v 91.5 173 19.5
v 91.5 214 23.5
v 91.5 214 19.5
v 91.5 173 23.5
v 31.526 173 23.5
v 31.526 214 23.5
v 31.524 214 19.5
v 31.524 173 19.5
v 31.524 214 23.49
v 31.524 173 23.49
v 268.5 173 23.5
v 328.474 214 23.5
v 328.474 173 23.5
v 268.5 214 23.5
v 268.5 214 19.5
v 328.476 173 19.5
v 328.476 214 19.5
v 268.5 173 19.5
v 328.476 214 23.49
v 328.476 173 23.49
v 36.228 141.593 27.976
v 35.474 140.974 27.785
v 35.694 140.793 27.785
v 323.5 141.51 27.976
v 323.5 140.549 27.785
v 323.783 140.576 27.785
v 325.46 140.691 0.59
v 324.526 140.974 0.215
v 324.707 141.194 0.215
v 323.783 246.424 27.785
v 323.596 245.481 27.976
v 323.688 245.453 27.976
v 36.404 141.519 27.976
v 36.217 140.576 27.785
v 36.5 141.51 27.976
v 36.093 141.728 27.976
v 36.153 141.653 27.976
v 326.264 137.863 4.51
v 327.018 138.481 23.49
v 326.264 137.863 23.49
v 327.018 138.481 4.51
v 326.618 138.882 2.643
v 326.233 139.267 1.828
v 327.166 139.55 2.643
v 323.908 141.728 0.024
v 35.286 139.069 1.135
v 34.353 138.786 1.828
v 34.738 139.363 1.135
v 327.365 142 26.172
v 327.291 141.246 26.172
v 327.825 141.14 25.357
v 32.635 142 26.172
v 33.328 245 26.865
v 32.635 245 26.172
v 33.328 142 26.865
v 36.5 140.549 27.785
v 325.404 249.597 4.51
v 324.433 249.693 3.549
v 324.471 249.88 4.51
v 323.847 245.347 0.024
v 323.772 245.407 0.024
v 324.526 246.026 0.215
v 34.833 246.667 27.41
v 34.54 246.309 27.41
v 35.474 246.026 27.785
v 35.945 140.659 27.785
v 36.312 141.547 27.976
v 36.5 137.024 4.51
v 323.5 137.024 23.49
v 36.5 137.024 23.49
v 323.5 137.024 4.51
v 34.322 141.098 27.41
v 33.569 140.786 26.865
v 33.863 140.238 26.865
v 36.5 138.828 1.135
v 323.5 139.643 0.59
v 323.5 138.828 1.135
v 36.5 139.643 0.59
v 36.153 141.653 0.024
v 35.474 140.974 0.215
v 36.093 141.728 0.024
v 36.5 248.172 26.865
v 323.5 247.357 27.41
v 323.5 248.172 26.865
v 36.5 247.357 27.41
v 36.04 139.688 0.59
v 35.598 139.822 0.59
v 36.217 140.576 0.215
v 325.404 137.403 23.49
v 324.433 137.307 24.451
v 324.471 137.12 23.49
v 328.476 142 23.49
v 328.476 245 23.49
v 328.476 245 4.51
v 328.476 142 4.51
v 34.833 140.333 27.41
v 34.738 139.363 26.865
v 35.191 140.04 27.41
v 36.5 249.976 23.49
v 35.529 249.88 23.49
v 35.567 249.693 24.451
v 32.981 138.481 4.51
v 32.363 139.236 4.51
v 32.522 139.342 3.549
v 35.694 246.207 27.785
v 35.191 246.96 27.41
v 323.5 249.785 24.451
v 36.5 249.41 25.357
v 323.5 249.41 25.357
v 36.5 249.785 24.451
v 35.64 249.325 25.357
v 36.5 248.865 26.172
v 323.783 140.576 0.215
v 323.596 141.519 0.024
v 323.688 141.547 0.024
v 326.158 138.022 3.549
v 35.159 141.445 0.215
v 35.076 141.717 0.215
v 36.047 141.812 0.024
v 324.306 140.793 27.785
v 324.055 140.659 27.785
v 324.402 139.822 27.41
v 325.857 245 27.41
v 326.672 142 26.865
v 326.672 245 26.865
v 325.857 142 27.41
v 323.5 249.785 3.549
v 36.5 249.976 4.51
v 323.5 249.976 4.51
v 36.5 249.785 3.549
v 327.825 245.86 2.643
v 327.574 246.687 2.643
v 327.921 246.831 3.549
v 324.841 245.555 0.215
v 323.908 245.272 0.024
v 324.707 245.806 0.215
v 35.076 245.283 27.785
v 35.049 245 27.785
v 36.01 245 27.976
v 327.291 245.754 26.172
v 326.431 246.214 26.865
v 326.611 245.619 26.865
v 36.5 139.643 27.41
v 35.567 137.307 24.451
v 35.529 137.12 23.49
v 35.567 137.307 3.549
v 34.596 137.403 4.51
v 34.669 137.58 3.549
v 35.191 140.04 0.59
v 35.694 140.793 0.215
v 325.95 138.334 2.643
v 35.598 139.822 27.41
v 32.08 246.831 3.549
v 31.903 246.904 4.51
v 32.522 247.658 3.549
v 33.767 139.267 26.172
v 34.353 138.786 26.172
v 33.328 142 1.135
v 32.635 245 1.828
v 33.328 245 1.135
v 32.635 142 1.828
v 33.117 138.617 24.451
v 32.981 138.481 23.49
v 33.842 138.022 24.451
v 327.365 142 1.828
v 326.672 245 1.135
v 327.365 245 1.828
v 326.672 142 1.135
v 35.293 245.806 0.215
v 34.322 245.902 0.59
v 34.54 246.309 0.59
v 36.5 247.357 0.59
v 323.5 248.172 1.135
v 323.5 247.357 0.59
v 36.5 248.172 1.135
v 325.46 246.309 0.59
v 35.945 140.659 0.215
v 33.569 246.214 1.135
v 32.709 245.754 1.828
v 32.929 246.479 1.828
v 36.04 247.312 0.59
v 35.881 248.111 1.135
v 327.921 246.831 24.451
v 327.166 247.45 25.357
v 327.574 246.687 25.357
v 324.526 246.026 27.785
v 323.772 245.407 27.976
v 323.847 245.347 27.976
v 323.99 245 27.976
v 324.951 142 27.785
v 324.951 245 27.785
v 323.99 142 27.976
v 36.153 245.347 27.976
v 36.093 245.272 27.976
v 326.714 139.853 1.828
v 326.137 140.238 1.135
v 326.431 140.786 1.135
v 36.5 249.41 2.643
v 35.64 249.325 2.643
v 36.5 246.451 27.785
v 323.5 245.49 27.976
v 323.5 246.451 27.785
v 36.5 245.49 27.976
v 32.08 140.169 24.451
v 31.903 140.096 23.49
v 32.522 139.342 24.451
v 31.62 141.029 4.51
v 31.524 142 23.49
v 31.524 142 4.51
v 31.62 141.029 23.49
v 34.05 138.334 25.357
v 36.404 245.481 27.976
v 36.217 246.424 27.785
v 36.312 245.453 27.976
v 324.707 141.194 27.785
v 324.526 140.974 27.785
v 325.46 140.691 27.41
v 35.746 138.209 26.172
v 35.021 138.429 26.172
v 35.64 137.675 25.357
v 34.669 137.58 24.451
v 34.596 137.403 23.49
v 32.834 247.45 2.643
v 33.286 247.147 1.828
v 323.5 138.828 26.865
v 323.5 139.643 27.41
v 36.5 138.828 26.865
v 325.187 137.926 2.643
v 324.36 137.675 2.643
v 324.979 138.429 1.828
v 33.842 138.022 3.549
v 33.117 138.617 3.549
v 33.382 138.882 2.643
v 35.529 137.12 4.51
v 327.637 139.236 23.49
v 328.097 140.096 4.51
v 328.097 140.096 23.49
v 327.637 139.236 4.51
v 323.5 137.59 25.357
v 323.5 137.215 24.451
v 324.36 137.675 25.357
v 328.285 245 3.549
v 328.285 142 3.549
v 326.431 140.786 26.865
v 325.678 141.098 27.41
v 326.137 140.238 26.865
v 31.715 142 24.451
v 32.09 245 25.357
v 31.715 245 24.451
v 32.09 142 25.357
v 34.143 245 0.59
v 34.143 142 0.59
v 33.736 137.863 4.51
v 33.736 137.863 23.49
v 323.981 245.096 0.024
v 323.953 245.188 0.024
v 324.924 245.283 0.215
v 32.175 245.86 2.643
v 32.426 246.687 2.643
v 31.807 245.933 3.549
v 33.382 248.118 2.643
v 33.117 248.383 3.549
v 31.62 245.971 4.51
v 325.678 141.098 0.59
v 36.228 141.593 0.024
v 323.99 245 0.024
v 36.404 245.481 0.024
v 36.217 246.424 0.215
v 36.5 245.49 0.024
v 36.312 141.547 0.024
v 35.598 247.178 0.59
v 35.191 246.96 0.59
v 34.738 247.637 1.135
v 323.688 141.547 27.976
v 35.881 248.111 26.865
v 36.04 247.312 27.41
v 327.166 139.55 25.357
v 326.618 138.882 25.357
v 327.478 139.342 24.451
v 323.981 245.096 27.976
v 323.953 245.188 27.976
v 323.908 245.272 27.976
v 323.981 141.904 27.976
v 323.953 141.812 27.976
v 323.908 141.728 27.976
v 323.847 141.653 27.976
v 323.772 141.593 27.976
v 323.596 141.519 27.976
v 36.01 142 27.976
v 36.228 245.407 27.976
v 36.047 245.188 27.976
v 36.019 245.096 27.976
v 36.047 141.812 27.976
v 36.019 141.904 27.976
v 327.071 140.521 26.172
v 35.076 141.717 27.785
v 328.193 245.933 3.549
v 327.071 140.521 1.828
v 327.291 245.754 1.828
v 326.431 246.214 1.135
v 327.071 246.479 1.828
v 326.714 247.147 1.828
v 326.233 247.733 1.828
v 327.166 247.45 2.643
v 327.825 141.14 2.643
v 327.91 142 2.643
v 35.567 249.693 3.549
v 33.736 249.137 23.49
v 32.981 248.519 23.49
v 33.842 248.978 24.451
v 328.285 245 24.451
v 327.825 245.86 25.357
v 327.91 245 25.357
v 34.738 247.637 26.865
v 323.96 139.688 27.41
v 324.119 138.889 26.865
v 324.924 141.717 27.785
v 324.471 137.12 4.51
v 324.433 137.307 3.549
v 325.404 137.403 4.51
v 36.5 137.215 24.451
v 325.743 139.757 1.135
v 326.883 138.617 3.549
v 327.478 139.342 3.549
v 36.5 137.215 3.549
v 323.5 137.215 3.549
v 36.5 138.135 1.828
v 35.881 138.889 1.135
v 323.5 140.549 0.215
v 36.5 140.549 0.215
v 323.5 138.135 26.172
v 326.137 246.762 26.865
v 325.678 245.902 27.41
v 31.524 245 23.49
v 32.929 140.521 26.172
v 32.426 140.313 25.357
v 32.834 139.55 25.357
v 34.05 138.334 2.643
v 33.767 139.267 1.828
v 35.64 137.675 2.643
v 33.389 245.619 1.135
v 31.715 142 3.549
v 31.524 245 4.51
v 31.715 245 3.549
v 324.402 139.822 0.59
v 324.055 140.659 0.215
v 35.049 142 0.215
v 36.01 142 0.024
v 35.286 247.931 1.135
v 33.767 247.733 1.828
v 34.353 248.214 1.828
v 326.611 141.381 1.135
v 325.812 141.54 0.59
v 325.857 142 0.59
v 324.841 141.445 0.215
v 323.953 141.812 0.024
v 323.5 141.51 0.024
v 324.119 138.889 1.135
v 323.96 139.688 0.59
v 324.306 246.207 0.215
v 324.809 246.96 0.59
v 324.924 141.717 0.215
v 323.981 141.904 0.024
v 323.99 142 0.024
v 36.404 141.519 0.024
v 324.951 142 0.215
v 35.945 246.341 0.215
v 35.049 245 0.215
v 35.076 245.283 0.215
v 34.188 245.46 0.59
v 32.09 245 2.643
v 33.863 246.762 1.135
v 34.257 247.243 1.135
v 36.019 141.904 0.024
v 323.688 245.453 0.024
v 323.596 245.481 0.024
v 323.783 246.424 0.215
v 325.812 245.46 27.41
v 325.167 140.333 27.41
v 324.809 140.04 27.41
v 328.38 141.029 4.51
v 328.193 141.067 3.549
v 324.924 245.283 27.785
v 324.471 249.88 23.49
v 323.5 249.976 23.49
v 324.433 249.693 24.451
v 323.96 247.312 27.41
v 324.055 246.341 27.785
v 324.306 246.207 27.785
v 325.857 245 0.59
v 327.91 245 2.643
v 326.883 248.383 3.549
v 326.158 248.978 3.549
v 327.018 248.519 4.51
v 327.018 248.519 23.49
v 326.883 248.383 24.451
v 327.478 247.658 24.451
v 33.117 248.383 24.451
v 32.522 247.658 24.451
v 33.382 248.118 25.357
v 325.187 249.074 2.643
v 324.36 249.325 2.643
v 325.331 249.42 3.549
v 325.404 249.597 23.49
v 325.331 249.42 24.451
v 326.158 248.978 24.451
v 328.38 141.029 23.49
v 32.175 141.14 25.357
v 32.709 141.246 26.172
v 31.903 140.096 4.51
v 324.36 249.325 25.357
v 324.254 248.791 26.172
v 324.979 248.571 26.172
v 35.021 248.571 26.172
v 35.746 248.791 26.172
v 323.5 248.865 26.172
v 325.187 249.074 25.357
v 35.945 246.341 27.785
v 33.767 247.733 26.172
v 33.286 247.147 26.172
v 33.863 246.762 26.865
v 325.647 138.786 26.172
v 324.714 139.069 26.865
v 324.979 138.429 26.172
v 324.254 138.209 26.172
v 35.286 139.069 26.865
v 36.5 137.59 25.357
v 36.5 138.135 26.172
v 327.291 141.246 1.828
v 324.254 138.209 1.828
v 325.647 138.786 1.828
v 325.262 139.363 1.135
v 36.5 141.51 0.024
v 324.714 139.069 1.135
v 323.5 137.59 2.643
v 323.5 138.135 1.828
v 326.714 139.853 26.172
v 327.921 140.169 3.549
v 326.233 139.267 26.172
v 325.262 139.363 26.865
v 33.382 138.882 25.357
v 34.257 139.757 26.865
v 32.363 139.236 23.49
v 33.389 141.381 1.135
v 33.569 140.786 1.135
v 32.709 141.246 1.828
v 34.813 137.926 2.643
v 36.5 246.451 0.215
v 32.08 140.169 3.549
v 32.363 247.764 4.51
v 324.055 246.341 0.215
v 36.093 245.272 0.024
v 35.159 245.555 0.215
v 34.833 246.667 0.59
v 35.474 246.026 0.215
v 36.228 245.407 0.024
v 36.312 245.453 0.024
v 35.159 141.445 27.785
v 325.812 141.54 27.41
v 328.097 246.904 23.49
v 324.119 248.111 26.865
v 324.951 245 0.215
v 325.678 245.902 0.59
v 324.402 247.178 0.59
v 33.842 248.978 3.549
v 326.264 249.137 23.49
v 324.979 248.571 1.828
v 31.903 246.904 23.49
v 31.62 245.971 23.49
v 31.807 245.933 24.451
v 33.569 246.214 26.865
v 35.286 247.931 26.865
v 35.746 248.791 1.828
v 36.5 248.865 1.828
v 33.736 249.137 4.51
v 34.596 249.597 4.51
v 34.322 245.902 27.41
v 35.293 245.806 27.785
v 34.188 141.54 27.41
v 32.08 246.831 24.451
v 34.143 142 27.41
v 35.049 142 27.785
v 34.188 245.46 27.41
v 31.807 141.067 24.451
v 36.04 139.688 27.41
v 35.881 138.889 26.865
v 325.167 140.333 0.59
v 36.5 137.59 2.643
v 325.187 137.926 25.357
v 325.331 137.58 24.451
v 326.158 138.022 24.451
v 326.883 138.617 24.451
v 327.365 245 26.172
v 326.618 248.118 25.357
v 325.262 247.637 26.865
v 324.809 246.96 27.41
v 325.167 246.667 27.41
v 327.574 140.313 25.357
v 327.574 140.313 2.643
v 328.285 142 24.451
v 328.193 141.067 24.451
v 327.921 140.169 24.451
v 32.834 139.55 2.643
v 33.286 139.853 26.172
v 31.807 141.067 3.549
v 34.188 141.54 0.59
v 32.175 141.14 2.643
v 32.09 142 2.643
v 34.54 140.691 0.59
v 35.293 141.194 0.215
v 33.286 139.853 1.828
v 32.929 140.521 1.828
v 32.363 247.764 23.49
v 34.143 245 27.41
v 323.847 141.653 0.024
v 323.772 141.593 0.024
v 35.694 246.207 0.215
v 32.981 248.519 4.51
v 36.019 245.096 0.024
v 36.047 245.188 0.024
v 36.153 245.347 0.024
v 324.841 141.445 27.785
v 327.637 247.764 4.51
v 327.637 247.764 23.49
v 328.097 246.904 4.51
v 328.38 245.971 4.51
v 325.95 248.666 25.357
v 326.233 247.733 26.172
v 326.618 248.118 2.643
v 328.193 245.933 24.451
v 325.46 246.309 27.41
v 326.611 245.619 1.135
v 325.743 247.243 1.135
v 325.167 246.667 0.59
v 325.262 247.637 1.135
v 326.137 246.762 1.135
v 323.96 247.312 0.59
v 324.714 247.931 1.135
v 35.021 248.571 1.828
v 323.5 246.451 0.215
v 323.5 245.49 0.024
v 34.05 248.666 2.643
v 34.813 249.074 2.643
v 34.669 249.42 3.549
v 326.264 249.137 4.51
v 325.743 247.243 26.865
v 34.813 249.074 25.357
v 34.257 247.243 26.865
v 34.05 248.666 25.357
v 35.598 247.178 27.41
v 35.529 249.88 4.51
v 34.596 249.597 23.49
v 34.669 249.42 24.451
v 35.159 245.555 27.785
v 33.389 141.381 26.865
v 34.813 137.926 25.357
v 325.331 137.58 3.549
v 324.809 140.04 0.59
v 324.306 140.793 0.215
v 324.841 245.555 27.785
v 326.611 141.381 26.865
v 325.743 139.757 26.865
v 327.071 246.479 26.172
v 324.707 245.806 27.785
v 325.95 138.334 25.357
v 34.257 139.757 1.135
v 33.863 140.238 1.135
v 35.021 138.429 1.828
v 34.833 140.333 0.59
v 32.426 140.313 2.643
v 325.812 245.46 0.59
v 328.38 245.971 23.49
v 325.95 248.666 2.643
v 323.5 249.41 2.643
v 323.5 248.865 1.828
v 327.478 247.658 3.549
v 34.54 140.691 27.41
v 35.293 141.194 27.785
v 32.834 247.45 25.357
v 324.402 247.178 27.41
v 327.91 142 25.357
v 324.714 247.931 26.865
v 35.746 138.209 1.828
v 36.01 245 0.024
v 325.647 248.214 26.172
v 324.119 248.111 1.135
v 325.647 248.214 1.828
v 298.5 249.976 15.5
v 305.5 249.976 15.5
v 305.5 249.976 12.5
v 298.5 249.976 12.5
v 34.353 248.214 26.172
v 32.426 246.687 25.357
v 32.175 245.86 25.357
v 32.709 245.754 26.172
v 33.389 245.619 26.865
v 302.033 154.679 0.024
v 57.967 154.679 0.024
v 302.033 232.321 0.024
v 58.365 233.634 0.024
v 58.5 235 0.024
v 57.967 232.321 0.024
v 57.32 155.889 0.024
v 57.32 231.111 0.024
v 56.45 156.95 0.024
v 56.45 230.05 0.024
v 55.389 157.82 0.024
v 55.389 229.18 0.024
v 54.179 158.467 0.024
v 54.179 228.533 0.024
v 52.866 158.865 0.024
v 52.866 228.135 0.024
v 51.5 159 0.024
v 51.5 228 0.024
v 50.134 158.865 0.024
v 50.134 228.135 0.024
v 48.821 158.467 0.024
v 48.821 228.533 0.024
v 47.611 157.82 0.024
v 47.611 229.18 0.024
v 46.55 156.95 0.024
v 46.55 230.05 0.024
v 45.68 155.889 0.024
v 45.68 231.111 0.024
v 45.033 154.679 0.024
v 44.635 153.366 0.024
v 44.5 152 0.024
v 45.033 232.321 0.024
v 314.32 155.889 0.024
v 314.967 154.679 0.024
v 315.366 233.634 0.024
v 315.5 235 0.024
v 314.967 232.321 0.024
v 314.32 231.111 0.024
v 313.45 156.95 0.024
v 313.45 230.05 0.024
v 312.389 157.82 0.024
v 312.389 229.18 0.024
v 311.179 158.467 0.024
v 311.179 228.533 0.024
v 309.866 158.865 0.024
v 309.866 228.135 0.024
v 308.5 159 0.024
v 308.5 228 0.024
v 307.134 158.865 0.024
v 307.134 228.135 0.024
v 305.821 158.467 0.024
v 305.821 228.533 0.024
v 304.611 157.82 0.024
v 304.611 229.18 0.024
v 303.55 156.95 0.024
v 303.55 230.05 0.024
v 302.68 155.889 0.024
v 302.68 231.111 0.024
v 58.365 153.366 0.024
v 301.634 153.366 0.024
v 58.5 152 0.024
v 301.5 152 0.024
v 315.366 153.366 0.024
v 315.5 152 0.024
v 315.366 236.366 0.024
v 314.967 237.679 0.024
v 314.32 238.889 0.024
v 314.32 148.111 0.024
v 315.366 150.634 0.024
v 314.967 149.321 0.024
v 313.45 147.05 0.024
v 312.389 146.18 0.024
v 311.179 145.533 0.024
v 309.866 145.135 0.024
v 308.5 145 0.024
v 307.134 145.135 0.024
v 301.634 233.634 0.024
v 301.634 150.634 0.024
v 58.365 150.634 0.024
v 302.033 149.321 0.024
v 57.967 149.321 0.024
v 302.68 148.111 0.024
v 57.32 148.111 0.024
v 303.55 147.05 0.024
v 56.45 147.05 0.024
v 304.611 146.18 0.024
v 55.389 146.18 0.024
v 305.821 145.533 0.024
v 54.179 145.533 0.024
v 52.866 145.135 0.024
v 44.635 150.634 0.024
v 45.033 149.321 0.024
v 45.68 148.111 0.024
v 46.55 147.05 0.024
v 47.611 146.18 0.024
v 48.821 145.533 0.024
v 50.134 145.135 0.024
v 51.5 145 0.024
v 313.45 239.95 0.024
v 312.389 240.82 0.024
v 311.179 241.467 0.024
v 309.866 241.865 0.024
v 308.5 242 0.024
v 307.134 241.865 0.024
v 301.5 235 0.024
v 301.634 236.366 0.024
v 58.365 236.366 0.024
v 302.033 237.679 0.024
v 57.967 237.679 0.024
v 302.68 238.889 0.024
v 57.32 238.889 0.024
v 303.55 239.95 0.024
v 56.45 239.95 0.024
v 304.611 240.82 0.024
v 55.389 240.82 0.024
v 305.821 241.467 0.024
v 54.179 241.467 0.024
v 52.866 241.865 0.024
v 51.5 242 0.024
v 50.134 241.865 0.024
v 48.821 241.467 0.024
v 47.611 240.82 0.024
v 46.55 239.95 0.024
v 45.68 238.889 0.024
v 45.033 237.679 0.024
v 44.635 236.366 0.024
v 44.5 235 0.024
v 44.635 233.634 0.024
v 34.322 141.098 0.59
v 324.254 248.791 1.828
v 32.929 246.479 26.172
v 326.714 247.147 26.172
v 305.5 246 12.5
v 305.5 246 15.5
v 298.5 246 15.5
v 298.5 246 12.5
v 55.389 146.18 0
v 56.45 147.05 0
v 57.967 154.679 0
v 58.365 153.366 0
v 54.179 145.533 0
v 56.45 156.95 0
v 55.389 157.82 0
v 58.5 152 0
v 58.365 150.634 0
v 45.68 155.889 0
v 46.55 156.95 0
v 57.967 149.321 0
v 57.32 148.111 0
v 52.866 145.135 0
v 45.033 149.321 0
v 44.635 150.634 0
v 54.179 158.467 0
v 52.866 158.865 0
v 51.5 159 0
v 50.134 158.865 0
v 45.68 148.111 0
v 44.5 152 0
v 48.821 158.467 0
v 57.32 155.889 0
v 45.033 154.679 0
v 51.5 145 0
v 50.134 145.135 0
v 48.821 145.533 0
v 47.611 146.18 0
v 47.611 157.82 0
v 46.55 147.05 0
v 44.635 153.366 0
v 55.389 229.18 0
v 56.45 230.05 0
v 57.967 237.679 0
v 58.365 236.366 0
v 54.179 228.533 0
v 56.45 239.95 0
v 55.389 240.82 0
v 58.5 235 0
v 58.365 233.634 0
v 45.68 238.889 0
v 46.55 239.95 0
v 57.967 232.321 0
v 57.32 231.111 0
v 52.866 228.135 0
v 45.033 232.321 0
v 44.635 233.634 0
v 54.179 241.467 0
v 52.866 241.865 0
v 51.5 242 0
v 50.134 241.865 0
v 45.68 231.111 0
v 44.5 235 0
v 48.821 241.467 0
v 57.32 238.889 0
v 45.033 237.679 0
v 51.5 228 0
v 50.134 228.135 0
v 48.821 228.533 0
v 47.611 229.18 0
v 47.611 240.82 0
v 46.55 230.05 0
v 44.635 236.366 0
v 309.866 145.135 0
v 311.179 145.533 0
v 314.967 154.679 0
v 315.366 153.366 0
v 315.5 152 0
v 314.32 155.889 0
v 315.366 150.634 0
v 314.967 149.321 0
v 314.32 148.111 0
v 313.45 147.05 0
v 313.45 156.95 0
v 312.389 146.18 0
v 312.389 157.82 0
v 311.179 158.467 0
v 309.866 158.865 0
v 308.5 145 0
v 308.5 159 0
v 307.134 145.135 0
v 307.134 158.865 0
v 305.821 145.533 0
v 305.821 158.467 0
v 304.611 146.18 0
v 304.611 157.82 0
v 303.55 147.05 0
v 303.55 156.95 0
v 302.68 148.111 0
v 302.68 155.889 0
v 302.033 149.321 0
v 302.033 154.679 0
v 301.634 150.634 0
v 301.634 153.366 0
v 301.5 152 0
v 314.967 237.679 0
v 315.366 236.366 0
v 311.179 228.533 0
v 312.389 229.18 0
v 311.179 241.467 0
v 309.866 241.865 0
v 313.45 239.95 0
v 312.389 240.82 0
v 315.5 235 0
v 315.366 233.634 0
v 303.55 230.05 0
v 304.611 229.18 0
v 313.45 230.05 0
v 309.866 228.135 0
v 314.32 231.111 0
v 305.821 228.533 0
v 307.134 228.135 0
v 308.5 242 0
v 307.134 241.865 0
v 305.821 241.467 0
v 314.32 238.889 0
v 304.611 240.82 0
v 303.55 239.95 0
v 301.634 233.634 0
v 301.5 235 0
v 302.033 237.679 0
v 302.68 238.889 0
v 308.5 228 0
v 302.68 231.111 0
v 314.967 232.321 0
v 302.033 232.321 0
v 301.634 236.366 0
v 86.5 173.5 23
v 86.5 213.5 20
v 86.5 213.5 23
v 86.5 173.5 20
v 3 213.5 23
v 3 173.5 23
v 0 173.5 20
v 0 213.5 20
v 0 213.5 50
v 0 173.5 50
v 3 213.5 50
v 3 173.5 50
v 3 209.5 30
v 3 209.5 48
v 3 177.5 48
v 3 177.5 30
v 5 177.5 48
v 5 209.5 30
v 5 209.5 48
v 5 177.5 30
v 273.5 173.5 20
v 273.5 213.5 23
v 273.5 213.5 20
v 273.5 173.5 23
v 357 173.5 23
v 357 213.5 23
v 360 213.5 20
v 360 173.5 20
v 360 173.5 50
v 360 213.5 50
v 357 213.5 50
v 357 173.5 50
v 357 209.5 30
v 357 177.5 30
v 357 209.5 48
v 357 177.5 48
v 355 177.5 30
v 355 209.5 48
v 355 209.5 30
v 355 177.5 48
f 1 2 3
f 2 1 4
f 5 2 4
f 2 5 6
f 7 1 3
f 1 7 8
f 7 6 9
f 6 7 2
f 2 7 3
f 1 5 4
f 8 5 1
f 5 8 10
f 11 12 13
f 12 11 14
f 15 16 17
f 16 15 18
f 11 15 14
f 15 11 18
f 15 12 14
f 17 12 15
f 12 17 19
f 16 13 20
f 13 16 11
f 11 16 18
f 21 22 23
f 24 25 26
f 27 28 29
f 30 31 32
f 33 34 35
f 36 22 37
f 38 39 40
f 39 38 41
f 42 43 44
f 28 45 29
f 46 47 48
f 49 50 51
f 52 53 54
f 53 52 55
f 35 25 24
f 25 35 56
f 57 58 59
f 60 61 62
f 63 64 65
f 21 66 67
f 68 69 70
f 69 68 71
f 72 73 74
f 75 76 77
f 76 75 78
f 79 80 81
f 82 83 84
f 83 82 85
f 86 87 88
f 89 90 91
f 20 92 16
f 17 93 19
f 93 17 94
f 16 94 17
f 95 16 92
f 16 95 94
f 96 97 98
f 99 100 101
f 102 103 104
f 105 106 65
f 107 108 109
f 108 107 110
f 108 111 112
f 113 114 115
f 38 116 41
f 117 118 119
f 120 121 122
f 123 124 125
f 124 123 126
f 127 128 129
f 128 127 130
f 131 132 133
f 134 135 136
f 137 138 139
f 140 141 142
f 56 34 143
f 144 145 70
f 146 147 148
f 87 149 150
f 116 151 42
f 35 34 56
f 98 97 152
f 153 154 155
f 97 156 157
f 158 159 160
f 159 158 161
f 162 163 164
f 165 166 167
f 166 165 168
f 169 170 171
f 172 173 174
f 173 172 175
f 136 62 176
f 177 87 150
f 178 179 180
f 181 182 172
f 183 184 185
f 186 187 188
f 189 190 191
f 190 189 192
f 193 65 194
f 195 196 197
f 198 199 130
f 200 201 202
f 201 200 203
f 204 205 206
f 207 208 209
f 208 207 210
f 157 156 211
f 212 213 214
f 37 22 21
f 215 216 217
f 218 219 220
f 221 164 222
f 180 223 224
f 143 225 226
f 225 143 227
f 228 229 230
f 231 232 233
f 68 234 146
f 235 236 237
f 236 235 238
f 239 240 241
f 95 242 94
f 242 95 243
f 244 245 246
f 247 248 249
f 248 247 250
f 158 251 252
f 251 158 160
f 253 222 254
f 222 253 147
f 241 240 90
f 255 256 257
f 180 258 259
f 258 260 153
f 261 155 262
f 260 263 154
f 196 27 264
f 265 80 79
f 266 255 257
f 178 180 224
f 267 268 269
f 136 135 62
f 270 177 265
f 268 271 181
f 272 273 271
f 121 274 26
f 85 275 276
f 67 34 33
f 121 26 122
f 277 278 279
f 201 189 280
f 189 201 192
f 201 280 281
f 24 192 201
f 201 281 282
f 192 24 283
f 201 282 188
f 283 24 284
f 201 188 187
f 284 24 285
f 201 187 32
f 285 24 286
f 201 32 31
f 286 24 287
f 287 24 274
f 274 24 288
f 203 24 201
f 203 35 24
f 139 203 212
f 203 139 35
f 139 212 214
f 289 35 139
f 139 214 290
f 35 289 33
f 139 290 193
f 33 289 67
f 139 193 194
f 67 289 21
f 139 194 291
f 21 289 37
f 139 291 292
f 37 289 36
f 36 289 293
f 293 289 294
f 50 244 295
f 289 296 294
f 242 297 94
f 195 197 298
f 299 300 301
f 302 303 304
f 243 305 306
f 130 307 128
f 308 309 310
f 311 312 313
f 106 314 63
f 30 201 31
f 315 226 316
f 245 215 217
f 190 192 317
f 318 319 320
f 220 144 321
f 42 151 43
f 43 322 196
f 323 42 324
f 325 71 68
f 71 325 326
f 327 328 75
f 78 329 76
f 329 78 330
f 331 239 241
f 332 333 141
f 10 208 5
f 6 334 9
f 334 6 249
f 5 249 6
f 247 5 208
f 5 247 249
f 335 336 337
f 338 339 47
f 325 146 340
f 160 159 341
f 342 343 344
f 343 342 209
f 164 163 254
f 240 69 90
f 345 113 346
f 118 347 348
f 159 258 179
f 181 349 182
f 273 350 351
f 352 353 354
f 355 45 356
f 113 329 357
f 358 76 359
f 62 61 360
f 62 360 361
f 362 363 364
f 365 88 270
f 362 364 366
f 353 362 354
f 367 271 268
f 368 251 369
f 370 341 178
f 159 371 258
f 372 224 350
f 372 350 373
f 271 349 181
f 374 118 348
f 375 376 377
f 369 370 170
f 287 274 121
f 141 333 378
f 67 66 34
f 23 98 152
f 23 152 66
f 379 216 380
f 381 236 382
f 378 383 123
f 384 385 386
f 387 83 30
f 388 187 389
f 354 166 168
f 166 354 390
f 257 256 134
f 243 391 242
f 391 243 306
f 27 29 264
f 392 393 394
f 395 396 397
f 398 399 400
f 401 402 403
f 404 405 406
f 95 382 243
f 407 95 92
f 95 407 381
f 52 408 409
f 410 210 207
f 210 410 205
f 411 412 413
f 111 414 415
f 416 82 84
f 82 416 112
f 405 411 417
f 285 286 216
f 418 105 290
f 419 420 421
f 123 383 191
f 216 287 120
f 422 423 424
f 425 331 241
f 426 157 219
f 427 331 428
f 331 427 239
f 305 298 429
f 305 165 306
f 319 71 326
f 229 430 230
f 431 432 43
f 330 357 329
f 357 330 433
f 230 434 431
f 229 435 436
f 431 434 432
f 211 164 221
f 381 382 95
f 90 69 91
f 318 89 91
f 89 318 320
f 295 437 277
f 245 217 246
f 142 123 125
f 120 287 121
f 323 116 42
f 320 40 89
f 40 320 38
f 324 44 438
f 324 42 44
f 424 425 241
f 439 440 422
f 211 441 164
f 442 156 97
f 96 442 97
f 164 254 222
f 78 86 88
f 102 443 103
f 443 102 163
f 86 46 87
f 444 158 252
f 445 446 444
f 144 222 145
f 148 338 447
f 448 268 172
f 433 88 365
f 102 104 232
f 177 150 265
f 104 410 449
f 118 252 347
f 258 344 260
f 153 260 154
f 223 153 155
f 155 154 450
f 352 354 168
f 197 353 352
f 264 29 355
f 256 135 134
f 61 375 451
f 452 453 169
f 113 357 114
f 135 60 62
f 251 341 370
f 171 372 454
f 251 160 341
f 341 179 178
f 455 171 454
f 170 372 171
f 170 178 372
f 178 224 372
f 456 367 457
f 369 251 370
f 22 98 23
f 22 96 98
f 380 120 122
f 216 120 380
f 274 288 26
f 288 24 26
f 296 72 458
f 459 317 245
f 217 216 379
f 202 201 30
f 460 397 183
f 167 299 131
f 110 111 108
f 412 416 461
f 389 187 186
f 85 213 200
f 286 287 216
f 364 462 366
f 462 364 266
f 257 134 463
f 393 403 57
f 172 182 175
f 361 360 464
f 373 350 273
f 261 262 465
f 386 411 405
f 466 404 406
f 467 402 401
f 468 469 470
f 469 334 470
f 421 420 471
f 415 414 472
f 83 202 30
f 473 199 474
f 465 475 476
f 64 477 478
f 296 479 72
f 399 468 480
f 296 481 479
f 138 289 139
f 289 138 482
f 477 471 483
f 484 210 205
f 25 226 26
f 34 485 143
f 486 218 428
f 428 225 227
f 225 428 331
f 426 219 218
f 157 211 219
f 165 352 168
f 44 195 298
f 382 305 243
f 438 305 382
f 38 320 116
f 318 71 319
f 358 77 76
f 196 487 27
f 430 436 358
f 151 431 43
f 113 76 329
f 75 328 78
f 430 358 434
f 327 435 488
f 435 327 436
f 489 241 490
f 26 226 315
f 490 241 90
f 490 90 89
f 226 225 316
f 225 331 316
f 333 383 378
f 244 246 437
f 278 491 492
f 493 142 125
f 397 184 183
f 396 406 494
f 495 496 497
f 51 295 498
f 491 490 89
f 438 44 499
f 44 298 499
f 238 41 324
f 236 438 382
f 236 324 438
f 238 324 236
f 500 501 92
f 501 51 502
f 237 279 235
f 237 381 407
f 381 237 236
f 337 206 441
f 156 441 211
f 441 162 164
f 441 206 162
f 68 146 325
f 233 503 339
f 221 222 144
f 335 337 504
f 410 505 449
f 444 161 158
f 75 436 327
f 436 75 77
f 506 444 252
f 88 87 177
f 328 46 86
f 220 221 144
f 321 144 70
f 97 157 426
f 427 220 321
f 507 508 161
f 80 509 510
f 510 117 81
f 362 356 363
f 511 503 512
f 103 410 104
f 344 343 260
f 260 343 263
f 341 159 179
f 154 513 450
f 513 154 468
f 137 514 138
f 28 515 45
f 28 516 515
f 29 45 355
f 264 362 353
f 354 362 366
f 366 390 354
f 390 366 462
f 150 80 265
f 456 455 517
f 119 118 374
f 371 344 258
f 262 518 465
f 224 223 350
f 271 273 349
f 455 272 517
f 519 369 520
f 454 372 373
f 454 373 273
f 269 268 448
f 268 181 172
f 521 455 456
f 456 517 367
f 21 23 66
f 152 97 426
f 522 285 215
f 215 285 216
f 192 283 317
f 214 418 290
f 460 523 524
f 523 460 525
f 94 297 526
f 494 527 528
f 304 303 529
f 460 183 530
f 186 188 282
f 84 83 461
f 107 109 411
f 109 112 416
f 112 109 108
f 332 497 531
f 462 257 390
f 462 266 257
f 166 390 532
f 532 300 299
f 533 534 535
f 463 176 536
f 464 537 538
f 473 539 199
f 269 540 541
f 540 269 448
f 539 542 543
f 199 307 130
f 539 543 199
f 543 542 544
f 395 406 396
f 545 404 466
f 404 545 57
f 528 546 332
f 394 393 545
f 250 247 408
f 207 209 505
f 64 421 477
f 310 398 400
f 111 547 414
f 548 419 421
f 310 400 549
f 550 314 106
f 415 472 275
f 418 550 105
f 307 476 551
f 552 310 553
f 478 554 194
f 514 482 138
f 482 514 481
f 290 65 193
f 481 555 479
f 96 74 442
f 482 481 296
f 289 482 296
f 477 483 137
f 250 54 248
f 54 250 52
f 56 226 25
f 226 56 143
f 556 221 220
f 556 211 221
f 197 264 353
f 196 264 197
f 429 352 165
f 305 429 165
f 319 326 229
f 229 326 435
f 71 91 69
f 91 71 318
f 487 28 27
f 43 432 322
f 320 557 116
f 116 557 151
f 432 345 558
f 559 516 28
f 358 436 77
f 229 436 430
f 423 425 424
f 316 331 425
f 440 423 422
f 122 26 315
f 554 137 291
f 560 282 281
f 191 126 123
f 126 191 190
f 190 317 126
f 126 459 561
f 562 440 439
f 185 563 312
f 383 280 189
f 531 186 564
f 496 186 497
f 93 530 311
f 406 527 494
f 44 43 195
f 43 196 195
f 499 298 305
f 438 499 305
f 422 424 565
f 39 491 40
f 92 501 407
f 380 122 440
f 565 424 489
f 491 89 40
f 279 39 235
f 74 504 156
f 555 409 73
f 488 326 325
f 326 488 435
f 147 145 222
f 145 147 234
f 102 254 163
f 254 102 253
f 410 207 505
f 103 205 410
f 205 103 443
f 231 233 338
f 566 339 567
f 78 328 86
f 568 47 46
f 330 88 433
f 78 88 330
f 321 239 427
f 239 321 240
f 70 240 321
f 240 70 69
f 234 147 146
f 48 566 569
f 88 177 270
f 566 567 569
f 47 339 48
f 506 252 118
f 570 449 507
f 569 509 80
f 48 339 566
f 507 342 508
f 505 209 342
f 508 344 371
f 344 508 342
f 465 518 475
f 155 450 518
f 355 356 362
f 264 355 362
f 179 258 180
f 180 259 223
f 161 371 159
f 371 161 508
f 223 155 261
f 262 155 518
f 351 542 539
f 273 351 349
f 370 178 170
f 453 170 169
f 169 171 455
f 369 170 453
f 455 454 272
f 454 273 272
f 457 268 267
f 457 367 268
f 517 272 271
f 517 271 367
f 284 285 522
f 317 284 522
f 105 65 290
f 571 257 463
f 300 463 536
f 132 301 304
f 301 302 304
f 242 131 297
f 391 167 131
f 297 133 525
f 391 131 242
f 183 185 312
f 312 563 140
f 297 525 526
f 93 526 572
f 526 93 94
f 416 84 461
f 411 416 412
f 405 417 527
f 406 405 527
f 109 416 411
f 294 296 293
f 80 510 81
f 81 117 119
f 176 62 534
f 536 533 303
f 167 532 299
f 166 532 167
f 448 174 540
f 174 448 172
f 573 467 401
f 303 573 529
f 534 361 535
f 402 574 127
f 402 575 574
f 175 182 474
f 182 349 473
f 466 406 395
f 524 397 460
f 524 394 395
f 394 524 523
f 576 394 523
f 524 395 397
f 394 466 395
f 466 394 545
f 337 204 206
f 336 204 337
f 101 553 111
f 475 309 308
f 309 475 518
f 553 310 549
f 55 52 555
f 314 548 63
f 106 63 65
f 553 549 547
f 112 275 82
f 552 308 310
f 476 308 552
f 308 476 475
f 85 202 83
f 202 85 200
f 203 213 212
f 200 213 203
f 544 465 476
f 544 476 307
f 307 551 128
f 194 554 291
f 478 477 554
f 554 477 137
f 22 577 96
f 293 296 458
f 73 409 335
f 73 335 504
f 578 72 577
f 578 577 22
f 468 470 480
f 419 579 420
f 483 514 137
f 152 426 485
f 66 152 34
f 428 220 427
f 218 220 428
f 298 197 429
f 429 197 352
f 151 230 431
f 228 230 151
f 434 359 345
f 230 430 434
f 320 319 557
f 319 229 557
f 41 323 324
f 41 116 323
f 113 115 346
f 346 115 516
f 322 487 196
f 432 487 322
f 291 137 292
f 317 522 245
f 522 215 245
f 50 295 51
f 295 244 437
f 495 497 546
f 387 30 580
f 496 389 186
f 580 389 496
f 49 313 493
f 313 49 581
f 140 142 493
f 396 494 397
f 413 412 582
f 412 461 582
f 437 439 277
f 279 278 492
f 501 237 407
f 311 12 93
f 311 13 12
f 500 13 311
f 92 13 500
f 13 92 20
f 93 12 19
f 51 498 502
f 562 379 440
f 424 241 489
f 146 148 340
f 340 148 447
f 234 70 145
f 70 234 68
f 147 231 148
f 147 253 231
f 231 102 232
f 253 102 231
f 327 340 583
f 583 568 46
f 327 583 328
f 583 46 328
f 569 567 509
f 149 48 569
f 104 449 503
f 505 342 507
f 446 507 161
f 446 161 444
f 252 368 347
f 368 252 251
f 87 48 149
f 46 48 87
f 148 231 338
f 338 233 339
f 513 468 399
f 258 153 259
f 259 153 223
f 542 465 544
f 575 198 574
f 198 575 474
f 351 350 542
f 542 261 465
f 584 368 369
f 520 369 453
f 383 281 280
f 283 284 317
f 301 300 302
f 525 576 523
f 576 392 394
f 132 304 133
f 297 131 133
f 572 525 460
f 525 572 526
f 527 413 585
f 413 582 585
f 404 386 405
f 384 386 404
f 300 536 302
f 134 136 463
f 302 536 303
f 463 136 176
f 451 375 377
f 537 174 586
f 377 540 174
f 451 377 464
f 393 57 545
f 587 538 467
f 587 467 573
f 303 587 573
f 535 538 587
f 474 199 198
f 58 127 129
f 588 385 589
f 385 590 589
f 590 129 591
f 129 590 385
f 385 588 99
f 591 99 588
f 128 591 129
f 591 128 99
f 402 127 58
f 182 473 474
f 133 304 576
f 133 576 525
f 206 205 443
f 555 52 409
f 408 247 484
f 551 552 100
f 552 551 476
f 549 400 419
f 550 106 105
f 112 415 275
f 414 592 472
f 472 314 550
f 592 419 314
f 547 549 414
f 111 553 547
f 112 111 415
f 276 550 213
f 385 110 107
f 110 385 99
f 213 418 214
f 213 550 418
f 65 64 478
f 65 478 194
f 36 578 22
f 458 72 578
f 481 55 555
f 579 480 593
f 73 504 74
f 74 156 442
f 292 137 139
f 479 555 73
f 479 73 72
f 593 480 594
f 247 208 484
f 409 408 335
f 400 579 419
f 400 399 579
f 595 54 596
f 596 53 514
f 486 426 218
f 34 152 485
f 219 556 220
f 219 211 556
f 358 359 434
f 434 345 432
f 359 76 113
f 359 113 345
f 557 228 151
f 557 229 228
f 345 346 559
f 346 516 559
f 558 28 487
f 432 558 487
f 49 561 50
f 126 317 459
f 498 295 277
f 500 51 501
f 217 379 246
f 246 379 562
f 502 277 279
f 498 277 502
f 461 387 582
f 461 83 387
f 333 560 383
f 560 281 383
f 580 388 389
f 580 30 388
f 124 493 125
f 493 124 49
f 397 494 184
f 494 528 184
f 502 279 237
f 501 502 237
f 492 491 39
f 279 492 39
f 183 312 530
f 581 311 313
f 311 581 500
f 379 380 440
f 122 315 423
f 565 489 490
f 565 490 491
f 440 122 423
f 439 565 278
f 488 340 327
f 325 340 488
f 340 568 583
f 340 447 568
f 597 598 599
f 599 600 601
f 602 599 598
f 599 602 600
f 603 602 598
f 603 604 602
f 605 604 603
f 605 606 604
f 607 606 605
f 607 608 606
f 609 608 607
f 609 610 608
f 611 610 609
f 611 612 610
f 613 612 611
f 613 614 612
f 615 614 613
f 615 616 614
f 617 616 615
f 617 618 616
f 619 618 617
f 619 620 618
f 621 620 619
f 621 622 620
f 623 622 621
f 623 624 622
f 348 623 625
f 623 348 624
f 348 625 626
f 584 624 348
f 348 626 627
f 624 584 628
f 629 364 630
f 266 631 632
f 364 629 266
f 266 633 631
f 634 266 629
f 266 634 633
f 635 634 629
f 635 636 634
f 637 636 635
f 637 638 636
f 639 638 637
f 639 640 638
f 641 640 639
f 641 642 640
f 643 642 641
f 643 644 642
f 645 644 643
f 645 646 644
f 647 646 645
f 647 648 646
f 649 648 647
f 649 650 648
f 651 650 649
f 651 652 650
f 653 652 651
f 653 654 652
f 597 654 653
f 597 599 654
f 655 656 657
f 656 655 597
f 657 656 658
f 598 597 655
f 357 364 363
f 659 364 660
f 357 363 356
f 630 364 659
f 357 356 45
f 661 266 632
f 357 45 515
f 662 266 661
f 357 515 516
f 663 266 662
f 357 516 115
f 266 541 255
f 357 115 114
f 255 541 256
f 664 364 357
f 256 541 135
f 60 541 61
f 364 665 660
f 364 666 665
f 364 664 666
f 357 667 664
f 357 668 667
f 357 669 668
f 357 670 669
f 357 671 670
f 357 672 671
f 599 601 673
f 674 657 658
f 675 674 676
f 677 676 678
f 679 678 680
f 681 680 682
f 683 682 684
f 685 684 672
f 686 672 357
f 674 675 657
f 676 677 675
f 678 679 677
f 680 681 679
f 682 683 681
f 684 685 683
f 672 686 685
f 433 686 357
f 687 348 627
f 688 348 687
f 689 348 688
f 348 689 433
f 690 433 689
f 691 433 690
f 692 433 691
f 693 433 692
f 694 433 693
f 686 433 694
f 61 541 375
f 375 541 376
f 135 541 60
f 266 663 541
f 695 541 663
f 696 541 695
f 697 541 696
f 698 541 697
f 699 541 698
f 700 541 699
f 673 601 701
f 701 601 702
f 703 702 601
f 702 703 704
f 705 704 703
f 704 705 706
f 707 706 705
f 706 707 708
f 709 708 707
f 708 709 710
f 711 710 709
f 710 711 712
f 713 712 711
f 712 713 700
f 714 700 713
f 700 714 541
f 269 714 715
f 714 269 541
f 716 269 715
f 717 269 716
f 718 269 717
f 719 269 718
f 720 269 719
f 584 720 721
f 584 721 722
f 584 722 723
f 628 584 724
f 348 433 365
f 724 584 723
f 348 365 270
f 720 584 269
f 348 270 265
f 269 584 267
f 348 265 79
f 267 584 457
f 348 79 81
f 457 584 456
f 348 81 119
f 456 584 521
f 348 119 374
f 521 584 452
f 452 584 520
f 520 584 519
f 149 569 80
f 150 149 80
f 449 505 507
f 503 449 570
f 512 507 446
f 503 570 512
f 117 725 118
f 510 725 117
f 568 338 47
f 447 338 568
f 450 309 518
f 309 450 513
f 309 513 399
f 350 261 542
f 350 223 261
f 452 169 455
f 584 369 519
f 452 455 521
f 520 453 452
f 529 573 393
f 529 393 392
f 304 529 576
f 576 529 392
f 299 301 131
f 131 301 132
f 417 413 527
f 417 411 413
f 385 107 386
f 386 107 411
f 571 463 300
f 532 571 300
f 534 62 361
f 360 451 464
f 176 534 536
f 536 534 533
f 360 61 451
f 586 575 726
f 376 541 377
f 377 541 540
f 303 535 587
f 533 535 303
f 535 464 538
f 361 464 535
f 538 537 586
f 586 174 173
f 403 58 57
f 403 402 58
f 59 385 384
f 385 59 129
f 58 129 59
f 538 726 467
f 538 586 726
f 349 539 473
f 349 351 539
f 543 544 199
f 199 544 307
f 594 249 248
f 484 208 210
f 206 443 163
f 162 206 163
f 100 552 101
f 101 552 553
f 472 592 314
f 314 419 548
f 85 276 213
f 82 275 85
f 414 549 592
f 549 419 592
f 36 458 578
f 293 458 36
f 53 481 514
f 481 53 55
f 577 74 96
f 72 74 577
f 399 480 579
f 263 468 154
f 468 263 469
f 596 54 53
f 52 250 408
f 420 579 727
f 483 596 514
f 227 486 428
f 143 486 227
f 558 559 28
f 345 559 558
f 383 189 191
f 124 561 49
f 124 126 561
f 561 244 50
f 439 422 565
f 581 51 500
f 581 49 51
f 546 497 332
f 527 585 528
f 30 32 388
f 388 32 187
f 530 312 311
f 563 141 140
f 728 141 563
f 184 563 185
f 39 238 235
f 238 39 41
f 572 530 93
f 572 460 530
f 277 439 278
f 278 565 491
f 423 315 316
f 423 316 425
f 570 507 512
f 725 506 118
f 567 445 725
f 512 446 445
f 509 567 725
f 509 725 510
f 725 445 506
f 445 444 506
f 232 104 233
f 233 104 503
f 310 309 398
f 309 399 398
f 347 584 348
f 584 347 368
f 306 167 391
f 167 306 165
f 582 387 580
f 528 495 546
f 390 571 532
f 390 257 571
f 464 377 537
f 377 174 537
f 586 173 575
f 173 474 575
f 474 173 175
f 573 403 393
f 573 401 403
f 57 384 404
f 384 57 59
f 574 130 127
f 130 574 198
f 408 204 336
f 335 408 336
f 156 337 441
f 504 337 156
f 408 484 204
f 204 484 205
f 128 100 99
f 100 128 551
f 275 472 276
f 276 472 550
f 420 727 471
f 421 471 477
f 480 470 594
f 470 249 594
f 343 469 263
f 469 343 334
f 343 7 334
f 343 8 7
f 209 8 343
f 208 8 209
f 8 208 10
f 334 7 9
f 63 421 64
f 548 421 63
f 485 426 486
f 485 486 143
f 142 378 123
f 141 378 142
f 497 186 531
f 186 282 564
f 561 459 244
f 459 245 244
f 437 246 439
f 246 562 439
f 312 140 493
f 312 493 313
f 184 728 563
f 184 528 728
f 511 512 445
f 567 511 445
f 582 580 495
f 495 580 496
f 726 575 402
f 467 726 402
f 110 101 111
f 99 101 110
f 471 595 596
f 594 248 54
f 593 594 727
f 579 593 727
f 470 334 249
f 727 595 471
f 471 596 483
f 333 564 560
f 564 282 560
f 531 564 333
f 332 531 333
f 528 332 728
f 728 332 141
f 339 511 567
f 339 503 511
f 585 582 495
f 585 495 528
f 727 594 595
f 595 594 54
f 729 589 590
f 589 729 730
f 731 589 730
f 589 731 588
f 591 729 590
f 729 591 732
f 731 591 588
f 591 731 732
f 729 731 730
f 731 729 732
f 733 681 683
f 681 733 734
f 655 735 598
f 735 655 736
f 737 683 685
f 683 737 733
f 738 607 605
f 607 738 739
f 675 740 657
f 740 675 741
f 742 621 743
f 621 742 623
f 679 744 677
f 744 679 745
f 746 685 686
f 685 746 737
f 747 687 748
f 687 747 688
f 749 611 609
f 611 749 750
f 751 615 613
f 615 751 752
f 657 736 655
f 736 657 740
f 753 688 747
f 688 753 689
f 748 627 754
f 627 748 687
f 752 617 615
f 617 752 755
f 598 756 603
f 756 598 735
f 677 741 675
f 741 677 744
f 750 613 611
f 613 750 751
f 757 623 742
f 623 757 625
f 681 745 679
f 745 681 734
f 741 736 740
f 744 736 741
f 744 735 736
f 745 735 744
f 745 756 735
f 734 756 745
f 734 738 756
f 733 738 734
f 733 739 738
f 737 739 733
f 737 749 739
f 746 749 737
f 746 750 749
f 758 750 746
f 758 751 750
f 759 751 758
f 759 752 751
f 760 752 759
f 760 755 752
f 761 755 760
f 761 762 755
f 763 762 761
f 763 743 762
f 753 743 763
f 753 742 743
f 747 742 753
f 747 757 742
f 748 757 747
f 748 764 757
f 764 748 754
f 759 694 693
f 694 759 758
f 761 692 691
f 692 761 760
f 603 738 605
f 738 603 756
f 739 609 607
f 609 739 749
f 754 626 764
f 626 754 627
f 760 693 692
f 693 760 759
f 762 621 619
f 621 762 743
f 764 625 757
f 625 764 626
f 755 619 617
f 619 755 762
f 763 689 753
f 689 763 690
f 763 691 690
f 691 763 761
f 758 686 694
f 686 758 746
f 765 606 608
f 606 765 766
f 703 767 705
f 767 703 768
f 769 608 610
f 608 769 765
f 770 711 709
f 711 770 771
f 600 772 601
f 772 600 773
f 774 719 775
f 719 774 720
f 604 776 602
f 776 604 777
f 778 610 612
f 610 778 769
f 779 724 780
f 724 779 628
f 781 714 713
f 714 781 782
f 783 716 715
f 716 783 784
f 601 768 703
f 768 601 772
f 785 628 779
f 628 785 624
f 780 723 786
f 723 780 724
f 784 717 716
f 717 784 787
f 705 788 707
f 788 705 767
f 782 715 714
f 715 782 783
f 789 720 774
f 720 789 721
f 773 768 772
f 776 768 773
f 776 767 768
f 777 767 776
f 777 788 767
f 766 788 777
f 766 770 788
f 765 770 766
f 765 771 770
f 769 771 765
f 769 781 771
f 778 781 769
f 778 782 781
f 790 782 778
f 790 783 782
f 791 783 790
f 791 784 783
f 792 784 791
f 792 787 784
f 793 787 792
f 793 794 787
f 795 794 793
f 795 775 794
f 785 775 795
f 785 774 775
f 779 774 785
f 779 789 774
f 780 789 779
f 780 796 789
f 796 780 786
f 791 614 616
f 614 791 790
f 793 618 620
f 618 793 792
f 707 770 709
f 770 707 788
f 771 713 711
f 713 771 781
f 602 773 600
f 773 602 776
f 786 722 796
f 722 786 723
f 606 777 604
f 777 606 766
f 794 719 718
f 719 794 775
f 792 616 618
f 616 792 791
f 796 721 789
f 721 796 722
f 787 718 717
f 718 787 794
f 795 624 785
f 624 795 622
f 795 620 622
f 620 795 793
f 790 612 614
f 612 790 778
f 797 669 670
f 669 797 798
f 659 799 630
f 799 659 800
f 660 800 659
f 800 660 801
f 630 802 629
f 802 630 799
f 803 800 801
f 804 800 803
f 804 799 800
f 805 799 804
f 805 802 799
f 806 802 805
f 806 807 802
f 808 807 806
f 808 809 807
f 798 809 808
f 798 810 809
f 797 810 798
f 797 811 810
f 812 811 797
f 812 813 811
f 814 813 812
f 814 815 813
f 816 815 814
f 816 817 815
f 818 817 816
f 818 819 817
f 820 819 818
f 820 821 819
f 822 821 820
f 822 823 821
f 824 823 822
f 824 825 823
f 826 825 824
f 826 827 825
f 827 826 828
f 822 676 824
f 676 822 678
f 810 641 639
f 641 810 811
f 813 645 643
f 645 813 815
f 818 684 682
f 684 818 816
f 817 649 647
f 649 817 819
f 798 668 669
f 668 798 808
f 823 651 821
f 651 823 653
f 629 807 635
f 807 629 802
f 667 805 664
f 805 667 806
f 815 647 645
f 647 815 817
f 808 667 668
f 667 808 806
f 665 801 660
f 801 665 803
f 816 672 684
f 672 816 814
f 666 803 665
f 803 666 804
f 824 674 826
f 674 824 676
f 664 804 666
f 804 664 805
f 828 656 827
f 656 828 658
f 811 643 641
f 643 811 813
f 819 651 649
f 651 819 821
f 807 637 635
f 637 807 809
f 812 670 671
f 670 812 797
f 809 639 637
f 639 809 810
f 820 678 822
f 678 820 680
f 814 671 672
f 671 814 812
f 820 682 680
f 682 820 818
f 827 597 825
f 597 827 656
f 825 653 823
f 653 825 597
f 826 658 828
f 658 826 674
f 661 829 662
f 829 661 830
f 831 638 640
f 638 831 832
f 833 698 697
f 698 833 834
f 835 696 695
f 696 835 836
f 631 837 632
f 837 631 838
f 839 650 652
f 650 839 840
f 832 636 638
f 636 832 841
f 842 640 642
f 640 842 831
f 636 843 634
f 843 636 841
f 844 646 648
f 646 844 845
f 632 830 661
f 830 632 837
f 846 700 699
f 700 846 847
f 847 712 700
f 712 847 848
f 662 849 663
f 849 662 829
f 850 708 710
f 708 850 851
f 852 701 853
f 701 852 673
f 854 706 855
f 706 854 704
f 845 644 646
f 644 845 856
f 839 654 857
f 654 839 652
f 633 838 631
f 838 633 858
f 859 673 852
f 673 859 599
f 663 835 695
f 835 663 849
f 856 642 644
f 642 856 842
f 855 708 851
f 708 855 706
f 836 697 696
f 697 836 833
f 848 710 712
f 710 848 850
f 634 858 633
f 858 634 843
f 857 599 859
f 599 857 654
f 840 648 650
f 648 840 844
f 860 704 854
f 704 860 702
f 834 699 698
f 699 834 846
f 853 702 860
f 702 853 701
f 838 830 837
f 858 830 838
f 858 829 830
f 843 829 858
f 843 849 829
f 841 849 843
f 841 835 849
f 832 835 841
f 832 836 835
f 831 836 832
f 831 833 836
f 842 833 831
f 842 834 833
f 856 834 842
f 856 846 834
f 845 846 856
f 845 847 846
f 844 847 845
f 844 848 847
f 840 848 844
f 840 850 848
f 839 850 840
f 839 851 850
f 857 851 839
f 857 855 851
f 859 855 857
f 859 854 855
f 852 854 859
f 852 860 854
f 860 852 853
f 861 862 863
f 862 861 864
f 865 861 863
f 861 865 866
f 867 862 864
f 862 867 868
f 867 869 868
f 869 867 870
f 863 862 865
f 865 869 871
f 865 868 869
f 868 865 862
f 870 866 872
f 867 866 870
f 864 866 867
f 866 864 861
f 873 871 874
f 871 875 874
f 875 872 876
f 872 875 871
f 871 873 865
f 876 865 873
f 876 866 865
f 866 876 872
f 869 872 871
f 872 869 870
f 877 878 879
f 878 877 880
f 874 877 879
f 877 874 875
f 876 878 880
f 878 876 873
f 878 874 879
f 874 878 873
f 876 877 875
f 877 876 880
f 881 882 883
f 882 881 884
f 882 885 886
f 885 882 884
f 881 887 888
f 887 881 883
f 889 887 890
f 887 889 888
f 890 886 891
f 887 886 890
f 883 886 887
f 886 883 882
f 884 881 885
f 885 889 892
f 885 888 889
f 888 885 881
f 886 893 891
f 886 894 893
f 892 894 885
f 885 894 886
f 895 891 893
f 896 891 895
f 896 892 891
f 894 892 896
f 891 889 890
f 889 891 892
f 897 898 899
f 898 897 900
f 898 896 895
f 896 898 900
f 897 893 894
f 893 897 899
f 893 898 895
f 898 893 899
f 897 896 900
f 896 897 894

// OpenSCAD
// =====================================================
//  Base de seguridad para notebook (con brazos laterales)
//  Cuerpo: 297 × 113 × 28 mm (ancho × profundidad × alto)
//  Ancho total con brazos abiertos (15,6"): ~360 mm
//  Huella total con notebook encima: ~360 × 250 mm
//
//  Ejes: X = ancho, Y = profundidad (frente/usuario en Y = 0),
//        Z = alto. La base va bajo la parte trasera del notebook.
//  Unidades: milímetros
// =====================================================

$fn = 32;

// ---------- Parámetros principales ----------
CUERPO_ANCHO = 297;
CUERPO_PROF  = 113;
CUERPO_ALTO  = 28;
radio_borde  = 5;

ancho_abierto = 360;   // ancho total con brazos (≈ 360 para 15,6")
huella_prof   = 250;   // profundidad del notebook de 15,6"

// Brazos (medidas aproximadas: la ficha no las especifica)
brazo_prof     = 40;   // ancho del brazo en Y
brazo_esp      = 3;    // espesor de la placa
brazo_z        = CUERPO_ALTO - 8;   // altura donde sale la placa
pestana_esp    = 3;    // espesor de la pestaña vertical
pestana_alto   = 22;   // sobre la cara superior del cuerpo
goma_esp       = 2;    // tope de goma

mostrar_candado  = false;  // la ficha permite omitirlo

// ---------- Derivados ----------
x0        = (ancho_abierto - CUERPO_ANCHO) / 2;   // inicio del cuerpo en X
y0        = huella_prof - CUERPO_PROF;            // cuerpo pegado al borde trasero

// ---------- Utilidades ----------
module caja_redondeada(size, r) {
    hull()
        for (x = [r, size[0] - r], y = [r, size[1] - r], z = [r, size[2] - r])
            translate([x, y, z]) sphere(r = r);
}

// ---------- Cuerpo ----------
module cuerpo() {
    color("#b8bcc2")
    difference() {
        translate([x0, y0, 0])
            caja_redondeada([CUERPO_ANCHO, CUERPO_PROF, CUERPO_ALTO], radio_borde);

        // Guías donde se deslizan los brazos
        for (lado = [0, 1])
            translate([lado == 0 ? x0 - 1 : x0 + CUERPO_ANCHO - 60,
                       y0 + (CUERPO_PROF - brazo_prof) / 2 - 0.5,
                       brazo_z - 0.5])
                cube([61, brazo_prof + 1, brazo_esp + 1]);

        // Ranura de seguridad (cara trasera, extremo derecho)
        translate([x0 + CUERPO_ANCHO - 30, y0 + CUERPO_PROF - 4, CUERPO_ALTO / 2 - 1.5])
            cube([7, 5, 3]);
    }
    // Patas de goma
    color("#222")
    for (x = [x0 + 20, x0 + CUERPO_ANCHO - 20], y = [y0 + 15, y0 + CUERPO_PROF - 15])
        translate([x, y, 0]) cylinder(d = 14, h = 1);
}

// ---------- Brazo lateral ----------
// Se modela el brazo izquierdo y se refleja para el derecho.
module brazo() {
    yb = y0 + (CUERPO_PROF - brazo_prof) / 2;
    largo = x0 + 55;   // tramo dentro de la guía + tramo exterior
    // Placa
    color("#9a9ea4")
        translate([0, yb, brazo_z]) cube([largo, brazo_prof, brazo_esp]);
    // Pestaña vertical
    color("#9a9ea4")
        translate([0, yb, brazo_z])
            cube([pestana_esp, brazo_prof, CUERPO_ALTO - brazo_z + pestana_alto]);
    // Tope de goma (cara interior)
    color("#111")
        translate([pestana_esp, yb + 4, CUERPO_ALTO + 2])
            cube([goma_esp, brazo_prof - 8, pestana_alto - 4]);
}

module brazos() {
    brazo();
    translate([ancho_abierto, 0, 0]) mirror([1, 0, 0]) brazo();
}

// ---------- Candado (opcional) ----------
module candado() {
    xs = x0 + CUERPO_ANCHO - 26.5;
    ys = y0 + CUERPO_PROF;
    color("#555") {
        translate([xs - 10, ys, CUERPO_ALTO / 2 - 9]) cube([20, 25, 18]);
        // Cable de acero
        translate([xs, ys + 25, CUERPO_ALTO / 2])
            rotate([-90, 0, 0]) cylinder(d = 5, h = 120);
    }
}

// ---------- Ensamble ----------
module seguro_pc() {
    cuerpo();
    brazos();
    if (mostrar_candado) candado();
}

seguro_pc();
